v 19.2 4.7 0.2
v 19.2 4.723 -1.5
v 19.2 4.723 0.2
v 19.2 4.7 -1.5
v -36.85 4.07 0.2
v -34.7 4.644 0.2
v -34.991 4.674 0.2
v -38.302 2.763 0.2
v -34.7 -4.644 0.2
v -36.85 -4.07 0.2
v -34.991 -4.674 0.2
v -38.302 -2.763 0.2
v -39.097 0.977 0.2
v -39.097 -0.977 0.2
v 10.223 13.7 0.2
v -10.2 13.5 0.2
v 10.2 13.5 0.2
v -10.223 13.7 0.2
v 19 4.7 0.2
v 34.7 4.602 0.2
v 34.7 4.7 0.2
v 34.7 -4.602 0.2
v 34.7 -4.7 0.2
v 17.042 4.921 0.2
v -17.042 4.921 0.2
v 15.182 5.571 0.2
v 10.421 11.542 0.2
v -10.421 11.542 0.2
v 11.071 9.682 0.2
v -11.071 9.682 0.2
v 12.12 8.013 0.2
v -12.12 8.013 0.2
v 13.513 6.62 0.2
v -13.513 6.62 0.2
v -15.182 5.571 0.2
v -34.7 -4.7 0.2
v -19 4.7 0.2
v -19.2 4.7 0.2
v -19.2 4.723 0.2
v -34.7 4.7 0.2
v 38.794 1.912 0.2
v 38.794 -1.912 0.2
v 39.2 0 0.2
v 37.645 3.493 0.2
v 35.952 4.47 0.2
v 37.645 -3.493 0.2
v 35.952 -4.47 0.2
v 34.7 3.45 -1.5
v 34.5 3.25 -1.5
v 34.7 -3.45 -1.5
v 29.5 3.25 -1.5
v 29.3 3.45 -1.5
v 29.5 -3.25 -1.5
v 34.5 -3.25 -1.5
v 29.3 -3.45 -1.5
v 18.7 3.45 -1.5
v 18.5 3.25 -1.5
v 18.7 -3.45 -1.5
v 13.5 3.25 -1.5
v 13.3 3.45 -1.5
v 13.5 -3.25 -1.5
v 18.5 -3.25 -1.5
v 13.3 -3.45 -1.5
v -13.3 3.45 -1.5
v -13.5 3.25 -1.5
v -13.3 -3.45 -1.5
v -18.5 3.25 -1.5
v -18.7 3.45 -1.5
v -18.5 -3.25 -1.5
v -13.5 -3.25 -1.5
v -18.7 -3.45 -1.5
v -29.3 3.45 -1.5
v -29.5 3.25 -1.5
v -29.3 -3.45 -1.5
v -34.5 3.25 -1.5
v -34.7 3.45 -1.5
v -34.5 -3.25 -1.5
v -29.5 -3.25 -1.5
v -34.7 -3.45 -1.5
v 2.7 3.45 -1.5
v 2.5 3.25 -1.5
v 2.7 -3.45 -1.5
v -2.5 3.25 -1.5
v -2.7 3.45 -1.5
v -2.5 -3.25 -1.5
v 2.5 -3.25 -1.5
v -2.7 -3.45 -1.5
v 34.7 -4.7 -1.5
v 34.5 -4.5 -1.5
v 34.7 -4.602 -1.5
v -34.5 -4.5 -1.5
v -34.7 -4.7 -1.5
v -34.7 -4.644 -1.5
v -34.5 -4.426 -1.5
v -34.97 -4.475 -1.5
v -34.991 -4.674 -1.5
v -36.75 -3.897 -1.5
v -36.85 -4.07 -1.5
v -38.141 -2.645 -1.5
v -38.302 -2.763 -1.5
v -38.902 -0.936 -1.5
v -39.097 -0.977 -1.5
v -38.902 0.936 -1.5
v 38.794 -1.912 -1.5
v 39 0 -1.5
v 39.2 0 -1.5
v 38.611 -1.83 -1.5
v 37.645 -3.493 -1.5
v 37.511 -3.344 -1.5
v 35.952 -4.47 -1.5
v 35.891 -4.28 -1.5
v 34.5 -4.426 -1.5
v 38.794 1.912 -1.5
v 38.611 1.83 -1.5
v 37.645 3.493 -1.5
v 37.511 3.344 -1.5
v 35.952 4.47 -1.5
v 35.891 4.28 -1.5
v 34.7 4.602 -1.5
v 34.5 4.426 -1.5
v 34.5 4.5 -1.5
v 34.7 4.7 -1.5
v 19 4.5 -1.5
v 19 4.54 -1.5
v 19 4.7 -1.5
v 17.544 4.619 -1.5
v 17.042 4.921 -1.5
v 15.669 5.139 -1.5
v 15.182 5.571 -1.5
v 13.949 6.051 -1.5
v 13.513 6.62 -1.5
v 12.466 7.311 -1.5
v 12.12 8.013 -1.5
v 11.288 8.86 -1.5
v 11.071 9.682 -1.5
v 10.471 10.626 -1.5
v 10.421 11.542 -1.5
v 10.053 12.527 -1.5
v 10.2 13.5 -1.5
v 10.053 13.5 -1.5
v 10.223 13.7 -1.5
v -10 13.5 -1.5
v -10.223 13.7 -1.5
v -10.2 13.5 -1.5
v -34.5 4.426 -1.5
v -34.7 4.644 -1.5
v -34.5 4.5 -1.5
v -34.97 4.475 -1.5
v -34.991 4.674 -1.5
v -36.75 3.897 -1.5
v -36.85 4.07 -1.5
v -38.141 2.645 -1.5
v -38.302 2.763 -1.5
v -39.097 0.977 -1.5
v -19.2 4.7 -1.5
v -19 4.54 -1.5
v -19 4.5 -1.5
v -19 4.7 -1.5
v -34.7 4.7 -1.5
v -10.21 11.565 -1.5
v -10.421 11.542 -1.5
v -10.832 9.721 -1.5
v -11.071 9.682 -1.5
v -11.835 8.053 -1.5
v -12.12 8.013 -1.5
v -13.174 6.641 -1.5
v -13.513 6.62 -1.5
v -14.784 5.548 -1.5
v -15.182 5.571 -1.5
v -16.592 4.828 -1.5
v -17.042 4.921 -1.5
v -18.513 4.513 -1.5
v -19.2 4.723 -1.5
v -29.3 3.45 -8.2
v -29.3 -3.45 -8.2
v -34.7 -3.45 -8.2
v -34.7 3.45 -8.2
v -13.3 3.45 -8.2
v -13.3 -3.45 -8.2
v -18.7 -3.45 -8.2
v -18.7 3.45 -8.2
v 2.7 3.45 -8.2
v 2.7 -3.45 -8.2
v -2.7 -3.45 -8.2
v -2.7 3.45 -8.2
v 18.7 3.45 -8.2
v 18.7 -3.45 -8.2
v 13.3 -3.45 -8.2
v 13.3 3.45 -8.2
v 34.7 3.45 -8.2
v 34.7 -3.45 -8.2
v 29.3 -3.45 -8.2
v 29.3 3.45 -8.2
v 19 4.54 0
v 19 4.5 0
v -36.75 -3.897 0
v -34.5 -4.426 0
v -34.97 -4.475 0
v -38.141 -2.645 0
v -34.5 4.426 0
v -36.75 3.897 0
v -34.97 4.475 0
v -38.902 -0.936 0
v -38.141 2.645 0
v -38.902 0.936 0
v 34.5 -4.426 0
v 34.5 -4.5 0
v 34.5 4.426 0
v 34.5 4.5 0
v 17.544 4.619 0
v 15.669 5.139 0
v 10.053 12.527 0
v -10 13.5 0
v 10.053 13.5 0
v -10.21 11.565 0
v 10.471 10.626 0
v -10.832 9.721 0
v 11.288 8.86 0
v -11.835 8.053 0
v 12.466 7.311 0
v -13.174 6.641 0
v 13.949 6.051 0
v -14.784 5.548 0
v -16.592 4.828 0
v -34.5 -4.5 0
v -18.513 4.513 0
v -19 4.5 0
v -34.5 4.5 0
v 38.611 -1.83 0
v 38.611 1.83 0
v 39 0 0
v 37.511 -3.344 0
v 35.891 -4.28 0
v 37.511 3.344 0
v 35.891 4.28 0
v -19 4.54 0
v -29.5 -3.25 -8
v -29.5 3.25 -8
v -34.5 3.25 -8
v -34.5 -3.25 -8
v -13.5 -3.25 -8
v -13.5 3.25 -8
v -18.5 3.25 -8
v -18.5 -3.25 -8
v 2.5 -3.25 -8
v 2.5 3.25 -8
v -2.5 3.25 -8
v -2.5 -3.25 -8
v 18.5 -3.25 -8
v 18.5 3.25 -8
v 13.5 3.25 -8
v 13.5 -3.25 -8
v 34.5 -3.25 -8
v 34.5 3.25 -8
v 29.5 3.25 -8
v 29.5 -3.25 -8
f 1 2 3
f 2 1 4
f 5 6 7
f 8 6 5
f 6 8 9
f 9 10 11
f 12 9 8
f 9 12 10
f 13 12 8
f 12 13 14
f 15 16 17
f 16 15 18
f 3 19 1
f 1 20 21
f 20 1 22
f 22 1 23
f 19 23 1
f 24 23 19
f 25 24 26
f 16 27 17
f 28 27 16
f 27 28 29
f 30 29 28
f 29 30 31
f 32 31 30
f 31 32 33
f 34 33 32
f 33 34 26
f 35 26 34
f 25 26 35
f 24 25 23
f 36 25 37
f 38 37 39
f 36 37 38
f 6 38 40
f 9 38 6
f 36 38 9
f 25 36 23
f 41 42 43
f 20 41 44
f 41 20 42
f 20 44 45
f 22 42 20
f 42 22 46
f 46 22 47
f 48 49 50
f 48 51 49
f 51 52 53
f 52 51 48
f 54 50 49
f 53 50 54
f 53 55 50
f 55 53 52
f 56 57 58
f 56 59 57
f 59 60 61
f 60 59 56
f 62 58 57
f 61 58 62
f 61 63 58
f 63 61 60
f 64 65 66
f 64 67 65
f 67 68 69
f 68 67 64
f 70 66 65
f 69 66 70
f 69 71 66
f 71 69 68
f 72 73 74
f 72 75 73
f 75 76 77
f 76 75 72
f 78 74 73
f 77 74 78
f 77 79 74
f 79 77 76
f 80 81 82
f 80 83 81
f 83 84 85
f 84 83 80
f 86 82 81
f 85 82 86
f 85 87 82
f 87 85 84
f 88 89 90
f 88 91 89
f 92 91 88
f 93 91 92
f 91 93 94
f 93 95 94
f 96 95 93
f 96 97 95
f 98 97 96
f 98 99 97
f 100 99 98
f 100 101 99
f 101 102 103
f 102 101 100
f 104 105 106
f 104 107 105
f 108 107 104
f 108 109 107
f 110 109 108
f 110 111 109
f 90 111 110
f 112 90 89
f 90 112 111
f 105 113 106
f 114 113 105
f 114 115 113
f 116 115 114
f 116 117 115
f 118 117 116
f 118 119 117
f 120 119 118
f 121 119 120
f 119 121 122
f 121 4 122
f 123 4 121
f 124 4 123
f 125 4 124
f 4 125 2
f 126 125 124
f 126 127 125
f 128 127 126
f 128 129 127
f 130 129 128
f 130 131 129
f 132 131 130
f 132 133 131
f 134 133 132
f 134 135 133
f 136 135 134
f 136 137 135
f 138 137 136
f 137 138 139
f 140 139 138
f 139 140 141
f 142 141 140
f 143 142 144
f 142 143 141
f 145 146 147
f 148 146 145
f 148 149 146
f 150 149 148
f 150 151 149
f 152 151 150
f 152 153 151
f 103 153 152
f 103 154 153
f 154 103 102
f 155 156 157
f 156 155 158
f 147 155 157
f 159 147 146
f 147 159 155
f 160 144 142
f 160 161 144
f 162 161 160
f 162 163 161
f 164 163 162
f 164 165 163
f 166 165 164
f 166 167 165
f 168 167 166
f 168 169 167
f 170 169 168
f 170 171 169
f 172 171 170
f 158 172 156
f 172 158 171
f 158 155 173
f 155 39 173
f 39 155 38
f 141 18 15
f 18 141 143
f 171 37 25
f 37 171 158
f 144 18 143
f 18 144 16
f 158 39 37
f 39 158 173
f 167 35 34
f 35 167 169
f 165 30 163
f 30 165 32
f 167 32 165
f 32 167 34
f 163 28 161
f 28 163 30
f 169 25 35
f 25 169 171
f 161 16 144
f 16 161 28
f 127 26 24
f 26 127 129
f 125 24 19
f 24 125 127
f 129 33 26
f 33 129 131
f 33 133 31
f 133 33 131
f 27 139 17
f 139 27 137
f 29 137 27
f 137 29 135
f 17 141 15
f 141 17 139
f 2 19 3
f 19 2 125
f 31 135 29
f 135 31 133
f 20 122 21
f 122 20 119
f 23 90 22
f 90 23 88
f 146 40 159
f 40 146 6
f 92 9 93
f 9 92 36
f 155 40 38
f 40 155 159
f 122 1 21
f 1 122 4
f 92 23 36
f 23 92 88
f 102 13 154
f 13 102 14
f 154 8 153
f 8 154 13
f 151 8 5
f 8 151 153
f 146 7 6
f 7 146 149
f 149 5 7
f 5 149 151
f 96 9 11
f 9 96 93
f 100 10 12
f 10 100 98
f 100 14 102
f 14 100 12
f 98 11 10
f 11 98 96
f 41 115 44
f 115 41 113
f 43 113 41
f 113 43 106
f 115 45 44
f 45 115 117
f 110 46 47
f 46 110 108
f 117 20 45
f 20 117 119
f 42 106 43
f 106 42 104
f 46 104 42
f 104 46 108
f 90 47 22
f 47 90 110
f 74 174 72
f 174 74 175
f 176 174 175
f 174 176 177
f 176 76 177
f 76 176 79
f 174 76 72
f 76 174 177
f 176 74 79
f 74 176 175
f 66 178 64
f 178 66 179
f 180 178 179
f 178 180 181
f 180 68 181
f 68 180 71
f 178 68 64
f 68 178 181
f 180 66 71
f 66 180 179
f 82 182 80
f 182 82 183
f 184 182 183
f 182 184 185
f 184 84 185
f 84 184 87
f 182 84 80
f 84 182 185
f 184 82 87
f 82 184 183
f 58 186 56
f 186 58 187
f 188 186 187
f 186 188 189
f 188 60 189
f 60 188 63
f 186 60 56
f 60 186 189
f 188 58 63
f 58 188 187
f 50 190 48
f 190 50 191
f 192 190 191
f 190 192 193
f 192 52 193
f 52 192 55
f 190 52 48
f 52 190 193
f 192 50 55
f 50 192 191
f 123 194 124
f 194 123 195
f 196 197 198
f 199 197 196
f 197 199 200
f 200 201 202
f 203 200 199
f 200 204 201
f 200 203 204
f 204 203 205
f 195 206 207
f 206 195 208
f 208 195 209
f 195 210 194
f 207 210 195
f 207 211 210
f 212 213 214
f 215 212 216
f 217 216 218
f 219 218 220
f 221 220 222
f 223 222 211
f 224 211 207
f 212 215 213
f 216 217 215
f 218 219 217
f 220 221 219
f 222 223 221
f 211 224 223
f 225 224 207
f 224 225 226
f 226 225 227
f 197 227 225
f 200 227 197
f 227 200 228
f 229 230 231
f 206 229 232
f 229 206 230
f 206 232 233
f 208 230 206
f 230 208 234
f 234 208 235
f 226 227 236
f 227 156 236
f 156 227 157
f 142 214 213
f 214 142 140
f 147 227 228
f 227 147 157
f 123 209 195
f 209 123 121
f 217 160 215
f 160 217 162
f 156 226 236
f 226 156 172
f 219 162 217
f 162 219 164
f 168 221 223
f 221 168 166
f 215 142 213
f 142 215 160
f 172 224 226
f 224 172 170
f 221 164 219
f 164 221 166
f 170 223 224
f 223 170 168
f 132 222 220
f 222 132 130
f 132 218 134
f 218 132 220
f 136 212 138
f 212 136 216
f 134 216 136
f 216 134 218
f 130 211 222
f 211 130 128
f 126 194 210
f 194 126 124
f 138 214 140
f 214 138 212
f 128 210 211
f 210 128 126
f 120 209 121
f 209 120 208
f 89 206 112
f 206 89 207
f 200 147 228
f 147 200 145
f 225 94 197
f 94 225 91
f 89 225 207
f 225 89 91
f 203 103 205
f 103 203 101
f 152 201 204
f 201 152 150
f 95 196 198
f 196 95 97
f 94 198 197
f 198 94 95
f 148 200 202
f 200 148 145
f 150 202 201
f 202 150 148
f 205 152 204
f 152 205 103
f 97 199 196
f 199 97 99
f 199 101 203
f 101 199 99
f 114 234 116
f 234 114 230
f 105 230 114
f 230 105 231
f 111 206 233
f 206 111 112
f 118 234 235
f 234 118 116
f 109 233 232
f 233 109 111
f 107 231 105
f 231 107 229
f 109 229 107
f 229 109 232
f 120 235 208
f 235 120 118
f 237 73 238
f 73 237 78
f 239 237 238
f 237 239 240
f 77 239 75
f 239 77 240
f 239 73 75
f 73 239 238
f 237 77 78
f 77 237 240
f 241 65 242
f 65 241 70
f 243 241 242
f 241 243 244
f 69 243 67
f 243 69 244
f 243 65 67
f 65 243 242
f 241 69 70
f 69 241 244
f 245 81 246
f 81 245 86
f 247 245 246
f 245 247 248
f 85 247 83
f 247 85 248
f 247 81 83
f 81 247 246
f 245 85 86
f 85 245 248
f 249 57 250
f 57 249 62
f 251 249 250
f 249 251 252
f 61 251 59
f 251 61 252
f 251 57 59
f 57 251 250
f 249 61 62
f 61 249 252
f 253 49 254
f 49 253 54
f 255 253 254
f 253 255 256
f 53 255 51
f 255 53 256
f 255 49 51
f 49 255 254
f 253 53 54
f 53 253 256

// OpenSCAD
tracker_depth=9;
tracker_width=78;
tracker_height=1.5;
tracker_core_width=78-tracker_depth;
tracker_connector_depth=18-tracker_depth;
tracker_connector_width=29;
tracker_connector_hole=1.4;
tracker_hole_x=tracker_connector_depth+1.75;
tracker_hole_y=tracker_connector_depth-5.8;
sensor_width=5;
sensor_depth=6.5;
sensor_height=6.5;
sensor_distance=16;

function sensorHeight() = tracker_height + sensor_height;

module tracker_board(security=0) {    
    translate([(tracker_core_width-(tracker_connector_width+tracker_connector_depth))/2,tracker_depth,0]){
        difference() {
            translate([-security,0,0]) cube([tracker_connector_width+tracker_connector_depth+2*security,tracker_connector_depth+security,tracker_height+security]);
            translate([0,tracker_depth,0]){
                cylinder(tracker_height+security,d=2*(tracker_depth-security));
            }
            translate([tracker_connector_width+tracker_connector_depth,tracker_depth,0]){
                cylinder(tracker_height+security,d=2*(tracker_depth-security));
            }
        }
    }
    translate([-security,-security,0]) cube([tracker_core_width+2*security,tracker_depth+2*security,tracker_height+security]);
    translate([0,tracker_depth/2,0]){
        cylinder(tracker_height+security,d=(tracker_depth+2*security));
    }
    translate([tracker_core_width,tracker_depth/2,0]){
        cylinder(tracker_height+security,d=tracker_depth+2*security);
    }
}

module sensor(security=0) {
    translate([-security, -security, -security]) cube([sensor_width+2*security,sensor_depth+2*security,sensor_height+security]);
}

module tracker(security=0) {
    translate([-(tracker_width/2), -tracker_depth/2,-tracker_height-sensor_height]) {
        translate([tracker_depth/2,0,sensor_height]) tracker_board(security);
        for(i=[0:4]) translate([(tracker_depth/2)+sensor_distance*i,(tracker_depth-sensor_depth)/2,0]) sensor(security);
    }
}


module mark() {
    linear_extrude(height = 2) {
        polygon([[0,0],[10,0],[5,10]]);
    }
}

module tracker_mask(security=0) {
    border=2;
    height=12;
    difference() {
        cube([(tracker_width-tracker_depth+2*sensor_distance)+2*border,sensor_distance*2+2*border,sensor_height+tracker_height+height]);
        translate([border,border,0]){
            cube([(tracker_width-tracker_depth+2*sensor_distance),sensor_distance*2,sensor_height+border+height]);
        }
    }
    translate([border,border,height]){
        difference() {
            translate([0,0,sensor_height-border]){
                cube([tracker_width-tracker_depth+2*sensor_distance,sensor_distance*2,tracker_height+border]);
            }
            translate([sensor_distance-(tracker_depth/2),(2*sensor_distance-tracker_depth)/2,0]){
                resize([tracker_width+2*security,0,0], auto=true) tracker();
            }
        }
    }
    for(i=[0:4]) {
        translate([border+sensor_distance+(i*(sensor_distance))-(10-sensor_width)/2,sensor_distance*2+2*border,0]){
            echo(border+sensor_distance+(i*(sensor_distance))-(10-sensor_width)/2);
            mark();
        }
    }
    for(i=[0:4]) {
        translate([border+sensor_distance+(i*(sensor_distance))+10-(10-sensor_width)/2,0,0]){
            rotate([0,0,180]) mark();
        }
    }
    translate([0,border+sensor_distance-5,0]){
        rotate([0,0,90]) mark();
    }
     translate([tracker_width-tracker_depth+2*sensor_distance+2*border,border+sensor_distance+5,0]){
        rotate([0,0,-90]) mark();
    }
   
}

//rotate([180,0,0]) tracker_mask();

difference() {
    tracker(0.2);
    tracker(0);
}
